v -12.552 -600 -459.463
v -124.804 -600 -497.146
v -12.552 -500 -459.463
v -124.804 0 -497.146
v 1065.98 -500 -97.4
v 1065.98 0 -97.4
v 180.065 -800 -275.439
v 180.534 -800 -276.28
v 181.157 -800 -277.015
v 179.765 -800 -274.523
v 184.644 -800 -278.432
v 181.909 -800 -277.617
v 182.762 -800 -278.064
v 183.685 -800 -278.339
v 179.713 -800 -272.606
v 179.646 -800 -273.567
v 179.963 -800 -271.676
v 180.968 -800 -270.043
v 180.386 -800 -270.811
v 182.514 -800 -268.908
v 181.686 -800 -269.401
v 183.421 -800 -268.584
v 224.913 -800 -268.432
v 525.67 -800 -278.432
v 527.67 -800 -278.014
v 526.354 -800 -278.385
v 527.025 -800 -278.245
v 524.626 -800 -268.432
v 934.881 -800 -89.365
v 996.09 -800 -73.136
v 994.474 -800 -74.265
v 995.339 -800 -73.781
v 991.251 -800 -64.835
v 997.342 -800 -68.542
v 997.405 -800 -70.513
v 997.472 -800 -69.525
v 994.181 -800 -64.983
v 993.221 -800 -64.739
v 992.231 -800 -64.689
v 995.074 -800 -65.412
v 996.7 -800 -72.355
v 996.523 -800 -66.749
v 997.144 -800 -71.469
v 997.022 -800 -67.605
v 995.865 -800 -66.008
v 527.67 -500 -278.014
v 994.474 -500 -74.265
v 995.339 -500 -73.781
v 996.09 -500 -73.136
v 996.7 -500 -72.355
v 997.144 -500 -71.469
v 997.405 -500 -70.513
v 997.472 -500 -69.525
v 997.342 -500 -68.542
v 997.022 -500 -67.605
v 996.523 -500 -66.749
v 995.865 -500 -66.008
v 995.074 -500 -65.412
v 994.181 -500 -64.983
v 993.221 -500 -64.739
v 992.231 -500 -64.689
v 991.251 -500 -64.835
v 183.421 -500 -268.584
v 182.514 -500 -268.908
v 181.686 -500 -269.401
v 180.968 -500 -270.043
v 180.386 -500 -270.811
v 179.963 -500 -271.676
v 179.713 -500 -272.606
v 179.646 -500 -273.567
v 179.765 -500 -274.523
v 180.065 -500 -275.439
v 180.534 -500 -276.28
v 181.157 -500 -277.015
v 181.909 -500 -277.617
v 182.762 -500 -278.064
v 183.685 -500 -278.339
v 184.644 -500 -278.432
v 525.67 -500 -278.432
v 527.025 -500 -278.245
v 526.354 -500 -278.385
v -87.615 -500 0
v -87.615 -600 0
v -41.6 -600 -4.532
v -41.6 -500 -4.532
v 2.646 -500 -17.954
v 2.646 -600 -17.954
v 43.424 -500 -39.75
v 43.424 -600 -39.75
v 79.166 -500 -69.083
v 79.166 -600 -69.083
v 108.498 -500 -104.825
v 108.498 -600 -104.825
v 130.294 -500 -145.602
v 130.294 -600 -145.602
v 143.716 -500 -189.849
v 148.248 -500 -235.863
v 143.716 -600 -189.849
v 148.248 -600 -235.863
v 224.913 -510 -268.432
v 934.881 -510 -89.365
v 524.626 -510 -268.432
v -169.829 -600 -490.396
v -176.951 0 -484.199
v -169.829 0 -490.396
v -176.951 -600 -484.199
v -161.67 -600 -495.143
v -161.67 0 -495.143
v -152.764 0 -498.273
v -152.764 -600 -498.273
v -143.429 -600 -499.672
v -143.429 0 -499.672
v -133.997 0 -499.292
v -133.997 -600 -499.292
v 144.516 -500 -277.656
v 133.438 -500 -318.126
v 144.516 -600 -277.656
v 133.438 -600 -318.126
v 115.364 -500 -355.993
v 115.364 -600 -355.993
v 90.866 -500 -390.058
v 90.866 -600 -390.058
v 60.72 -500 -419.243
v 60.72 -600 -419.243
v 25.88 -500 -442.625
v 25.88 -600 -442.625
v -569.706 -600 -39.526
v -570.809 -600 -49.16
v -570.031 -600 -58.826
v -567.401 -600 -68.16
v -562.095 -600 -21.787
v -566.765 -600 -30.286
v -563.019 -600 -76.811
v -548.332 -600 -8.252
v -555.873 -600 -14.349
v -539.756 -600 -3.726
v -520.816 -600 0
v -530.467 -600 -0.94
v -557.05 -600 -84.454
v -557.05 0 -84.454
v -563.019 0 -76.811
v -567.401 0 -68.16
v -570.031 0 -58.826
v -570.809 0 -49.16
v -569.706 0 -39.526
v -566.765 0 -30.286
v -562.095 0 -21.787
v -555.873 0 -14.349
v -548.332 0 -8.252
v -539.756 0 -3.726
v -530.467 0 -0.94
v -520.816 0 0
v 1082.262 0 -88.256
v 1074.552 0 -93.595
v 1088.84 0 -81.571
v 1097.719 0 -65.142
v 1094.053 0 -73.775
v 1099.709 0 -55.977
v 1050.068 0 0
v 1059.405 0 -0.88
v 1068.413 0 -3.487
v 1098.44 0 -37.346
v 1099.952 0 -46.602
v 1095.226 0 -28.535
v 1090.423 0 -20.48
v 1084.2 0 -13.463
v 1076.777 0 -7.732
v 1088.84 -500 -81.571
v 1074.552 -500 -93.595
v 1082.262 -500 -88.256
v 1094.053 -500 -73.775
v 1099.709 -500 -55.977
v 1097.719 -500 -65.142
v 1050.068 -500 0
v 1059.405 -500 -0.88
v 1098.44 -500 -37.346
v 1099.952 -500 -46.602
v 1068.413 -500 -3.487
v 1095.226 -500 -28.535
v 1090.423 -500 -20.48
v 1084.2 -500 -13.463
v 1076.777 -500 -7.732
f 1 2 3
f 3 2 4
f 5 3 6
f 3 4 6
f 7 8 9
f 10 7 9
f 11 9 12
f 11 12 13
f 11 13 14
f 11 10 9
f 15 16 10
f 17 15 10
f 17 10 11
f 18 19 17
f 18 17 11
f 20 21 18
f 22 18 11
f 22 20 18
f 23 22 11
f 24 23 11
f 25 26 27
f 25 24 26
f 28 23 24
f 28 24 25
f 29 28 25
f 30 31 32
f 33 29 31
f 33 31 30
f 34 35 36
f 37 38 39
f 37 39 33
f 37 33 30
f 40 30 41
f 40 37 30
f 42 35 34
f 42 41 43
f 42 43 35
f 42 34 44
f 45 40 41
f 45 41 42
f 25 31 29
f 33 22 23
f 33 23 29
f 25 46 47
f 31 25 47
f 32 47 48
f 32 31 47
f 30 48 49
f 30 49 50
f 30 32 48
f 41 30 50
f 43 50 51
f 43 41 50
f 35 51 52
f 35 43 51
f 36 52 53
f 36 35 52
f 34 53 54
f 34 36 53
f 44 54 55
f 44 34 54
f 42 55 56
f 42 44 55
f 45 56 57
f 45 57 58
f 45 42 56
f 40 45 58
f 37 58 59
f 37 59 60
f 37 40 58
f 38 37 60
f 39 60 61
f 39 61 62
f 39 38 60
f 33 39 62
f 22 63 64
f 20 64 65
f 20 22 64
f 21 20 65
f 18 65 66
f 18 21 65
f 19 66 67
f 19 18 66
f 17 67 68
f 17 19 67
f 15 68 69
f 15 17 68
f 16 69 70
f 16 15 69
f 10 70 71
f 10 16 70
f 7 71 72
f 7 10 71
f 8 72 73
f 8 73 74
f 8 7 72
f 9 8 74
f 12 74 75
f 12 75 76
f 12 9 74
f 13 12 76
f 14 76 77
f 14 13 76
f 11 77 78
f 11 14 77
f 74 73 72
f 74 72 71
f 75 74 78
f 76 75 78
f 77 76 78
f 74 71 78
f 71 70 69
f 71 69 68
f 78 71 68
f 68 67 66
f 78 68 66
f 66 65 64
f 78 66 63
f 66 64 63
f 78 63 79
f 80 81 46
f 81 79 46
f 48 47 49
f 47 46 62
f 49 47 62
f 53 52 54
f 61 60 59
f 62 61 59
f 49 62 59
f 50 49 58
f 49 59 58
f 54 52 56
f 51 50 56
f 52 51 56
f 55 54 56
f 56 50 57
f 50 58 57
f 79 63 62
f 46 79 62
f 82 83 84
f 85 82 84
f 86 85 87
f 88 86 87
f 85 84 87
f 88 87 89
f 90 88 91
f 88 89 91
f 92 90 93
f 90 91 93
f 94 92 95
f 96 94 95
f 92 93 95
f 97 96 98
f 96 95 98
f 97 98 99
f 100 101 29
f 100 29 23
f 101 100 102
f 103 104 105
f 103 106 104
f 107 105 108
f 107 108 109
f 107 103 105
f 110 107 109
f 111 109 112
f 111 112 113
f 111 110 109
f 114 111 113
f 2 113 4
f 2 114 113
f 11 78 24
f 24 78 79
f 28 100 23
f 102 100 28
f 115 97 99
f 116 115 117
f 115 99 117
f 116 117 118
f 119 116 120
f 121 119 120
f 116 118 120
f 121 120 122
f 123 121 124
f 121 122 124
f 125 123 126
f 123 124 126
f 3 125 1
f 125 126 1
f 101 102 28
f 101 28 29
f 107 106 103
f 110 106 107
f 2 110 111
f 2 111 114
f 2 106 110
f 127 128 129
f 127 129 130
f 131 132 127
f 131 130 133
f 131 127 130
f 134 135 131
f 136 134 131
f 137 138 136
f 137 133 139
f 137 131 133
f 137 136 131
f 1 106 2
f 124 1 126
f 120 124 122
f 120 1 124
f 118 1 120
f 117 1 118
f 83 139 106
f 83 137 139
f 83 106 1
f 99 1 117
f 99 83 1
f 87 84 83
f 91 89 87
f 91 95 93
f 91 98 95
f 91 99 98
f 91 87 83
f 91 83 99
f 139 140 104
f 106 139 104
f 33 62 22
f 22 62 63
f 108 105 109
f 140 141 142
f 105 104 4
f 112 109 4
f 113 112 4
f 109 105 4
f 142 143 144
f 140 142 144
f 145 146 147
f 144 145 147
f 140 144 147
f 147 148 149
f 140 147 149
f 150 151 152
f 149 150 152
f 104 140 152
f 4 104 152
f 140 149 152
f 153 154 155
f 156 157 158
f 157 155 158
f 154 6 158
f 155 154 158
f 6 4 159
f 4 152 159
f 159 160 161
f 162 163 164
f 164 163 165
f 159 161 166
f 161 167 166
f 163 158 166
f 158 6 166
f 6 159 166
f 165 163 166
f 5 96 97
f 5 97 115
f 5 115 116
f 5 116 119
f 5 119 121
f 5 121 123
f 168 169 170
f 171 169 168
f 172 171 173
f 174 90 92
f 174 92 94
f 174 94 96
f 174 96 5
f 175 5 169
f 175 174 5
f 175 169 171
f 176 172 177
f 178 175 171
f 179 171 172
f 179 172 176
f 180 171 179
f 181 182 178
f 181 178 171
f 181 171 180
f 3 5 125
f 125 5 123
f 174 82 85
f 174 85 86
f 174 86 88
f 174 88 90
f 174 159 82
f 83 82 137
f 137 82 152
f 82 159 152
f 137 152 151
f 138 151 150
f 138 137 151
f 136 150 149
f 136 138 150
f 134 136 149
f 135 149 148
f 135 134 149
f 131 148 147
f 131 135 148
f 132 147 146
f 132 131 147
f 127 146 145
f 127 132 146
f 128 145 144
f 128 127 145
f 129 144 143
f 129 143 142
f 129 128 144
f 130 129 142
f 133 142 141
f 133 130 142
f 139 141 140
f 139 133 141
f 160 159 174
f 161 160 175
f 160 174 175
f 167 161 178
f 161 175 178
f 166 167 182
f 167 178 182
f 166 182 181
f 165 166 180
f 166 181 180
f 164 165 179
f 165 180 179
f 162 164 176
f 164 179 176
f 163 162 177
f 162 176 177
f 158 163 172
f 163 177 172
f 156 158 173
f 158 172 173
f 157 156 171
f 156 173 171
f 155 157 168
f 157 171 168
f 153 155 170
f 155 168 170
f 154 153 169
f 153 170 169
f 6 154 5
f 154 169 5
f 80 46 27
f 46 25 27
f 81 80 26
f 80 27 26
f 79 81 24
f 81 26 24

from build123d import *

# Parameters (mm, degrees)
F1_DEPTH = 600
F2_R     = 50
F4_DEPTH = 100
F6_DEPTH = 300
F7_R     = 5
F8_T     = -10


with BuildPart() as f1:
    # F0 (on Front) → F1 (new body)
    with BuildSketch(Plane.XZ):
        Polygon((1356.1212984358, 0), (-637.3533882356, 0), (-155.0012858751, -507.2834014122), align=None)
    extrude(amount=F1_DEPTH)

    # F2
    f2_edges = [f1.edges().sort_by_distance(p)[0] for p in [
        (-155.001286, -300, -507.283401),
        (1356.121298, -300, 0),
        (-637.353388, -300, 0),
    ]]
    fillet(f2_edges, radius=F2_R)

    # F3 (on face) → F4 (cut)
    with BuildSketch(Plane.XZ.offset(600)):
        with BuildLine():
            ThreePointArc((-87.6147770705, 0), (79.1656448578, -69.0827124902), (148.2483575879, -235.8631343192))
            ThreePointArc((148.2483575879, -235.8631343192), (103.8739908829, -373.5710498814), (-12.5522699729, -459.4633092073))
            Line((-12.5522699729, -459.4633092073), (1065.979821355, -97.4004074272))
            ThreePointArc((1065.979821355, -97.4004074272), (1099.4133410746, -41.9383739655), (1050.0675187015, 0))
            Line((1050.0675187015, 0), (-87.6147770705, 0))
        make_face()
    extrude(amount=-F4_DEPTH, mode=Mode.SUBTRACT)


with BuildPart() as f6:
    # F5 (on face) → F6 (new body)
    with BuildSketch(Plane.XZ.offset(500)):
        Polygon((526.7137780926, -278.431857511), (1050.0675187015, -50), (144.3751410167, -278.431857511), align=None)
    extrude(amount=F6_DEPTH)

    # F7
    f7_edges = [f6.edges().sort_by_distance(p)[0] for p in [
        (144.375141, -650, -278.431858),
        (1050.067519, -650, -50),
        (526.713778, -650, -278.431858),
    ]]
    fillet(f7_edges, radius=F7_R)

    # F8
    f8_openings = [f6.faces().sort_by_distance(p)[0] for p in [
        (572.555984, -800, -202.870106),
    ]]
    offset(amount=F8_T, openings=f8_openings)


solid = Compound([f1.part, f6.part])
